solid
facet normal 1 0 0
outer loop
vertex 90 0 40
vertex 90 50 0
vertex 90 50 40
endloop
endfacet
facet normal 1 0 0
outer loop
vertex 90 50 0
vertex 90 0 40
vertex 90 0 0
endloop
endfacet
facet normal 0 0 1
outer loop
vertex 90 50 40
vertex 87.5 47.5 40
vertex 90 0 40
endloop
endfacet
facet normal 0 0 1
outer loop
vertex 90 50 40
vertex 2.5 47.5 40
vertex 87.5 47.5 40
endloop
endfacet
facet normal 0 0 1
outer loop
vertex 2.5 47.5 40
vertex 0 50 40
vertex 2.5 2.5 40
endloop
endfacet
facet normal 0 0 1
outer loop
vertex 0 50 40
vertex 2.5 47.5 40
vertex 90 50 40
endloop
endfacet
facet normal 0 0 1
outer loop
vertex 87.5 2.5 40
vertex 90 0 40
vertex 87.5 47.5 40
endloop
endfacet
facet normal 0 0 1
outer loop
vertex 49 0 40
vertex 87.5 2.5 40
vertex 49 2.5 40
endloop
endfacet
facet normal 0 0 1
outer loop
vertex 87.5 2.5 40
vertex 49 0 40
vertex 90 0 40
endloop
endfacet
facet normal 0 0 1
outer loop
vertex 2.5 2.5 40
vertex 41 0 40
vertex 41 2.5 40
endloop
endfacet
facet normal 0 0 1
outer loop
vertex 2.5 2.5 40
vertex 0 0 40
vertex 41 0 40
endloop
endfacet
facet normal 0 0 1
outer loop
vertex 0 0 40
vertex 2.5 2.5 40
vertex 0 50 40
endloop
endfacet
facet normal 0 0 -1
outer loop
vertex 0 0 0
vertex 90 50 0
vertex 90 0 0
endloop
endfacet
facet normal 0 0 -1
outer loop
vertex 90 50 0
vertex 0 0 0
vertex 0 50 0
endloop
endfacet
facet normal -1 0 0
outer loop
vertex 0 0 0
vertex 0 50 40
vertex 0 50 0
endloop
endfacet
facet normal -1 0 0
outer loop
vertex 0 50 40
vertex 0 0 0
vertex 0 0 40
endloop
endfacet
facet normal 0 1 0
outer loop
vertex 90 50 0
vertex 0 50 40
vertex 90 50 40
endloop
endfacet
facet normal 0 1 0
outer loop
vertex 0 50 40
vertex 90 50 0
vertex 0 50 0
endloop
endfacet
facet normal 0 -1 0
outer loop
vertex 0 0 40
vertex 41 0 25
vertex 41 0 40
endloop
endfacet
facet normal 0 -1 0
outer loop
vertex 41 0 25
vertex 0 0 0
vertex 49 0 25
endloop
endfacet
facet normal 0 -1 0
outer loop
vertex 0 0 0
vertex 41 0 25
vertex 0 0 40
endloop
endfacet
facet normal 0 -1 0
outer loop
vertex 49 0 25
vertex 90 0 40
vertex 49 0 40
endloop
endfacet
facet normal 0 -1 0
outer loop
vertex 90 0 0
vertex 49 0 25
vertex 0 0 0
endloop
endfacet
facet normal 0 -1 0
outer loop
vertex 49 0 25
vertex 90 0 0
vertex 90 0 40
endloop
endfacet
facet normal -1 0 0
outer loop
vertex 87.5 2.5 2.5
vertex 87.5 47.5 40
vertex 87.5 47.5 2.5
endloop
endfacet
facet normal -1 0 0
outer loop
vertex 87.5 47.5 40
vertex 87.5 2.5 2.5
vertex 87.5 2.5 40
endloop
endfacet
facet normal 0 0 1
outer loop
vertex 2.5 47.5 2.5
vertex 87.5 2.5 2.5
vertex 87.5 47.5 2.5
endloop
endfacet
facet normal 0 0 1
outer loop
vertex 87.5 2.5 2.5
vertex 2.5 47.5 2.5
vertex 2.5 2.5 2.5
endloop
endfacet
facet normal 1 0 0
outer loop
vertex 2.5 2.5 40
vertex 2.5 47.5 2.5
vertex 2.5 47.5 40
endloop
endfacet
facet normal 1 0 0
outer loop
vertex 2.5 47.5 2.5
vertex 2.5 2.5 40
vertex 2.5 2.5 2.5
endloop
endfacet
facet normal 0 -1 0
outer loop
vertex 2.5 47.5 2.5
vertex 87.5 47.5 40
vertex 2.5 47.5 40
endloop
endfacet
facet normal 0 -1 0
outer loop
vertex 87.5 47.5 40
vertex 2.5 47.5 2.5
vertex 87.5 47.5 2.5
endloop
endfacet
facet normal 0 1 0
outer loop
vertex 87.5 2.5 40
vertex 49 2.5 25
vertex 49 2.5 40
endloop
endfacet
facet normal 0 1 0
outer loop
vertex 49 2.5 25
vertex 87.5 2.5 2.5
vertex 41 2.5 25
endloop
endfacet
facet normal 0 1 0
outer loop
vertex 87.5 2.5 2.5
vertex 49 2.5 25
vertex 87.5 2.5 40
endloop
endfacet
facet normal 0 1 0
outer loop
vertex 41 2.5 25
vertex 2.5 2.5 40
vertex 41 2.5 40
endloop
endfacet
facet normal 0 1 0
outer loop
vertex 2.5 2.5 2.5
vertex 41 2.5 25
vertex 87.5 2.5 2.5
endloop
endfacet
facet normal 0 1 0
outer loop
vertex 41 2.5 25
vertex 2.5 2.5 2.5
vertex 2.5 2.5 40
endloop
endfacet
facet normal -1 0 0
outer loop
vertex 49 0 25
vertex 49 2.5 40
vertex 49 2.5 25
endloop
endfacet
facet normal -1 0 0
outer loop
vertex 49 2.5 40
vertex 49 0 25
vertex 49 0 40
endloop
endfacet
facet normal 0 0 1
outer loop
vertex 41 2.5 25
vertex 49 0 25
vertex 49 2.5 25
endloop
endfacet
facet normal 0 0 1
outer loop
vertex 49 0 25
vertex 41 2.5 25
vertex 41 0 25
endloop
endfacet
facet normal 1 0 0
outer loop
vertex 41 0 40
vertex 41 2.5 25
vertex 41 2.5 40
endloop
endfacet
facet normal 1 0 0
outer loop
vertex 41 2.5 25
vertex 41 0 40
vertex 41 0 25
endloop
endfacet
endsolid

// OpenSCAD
$fn = 32;

// ----------------------------------------------------------------------
// Enclosure box: notch enclosure
// ----------------------------------------------------------------------

// --- parameters (mm) ---
box_l = 90;               // outer length, X
box_w = 50;               // outer width, Y
box_h = 40;               // outer height
wall_t = 2.5;             // wall thickness
notch_w = 8;              // cable notch width
notch_h = 15;             // cable notch height

inner_h = box_h - wall_t;  // cavity depth
boss_h = inner_h - 2;  // corner boss height

difference() {
  union() {
    difference() {
      cube([box_l, box_w, box_h]);
      translate([wall_t, wall_t, wall_t])
        cube([box_l - 2 * wall_t, box_w - 2 * wall_t, box_h]);
    }
  }
  translate([box_l / 2 - notch_w / 2, -1, box_h - notch_h])
    cube([notch_w, wall_t + 2, notch_h + 1]);
}
